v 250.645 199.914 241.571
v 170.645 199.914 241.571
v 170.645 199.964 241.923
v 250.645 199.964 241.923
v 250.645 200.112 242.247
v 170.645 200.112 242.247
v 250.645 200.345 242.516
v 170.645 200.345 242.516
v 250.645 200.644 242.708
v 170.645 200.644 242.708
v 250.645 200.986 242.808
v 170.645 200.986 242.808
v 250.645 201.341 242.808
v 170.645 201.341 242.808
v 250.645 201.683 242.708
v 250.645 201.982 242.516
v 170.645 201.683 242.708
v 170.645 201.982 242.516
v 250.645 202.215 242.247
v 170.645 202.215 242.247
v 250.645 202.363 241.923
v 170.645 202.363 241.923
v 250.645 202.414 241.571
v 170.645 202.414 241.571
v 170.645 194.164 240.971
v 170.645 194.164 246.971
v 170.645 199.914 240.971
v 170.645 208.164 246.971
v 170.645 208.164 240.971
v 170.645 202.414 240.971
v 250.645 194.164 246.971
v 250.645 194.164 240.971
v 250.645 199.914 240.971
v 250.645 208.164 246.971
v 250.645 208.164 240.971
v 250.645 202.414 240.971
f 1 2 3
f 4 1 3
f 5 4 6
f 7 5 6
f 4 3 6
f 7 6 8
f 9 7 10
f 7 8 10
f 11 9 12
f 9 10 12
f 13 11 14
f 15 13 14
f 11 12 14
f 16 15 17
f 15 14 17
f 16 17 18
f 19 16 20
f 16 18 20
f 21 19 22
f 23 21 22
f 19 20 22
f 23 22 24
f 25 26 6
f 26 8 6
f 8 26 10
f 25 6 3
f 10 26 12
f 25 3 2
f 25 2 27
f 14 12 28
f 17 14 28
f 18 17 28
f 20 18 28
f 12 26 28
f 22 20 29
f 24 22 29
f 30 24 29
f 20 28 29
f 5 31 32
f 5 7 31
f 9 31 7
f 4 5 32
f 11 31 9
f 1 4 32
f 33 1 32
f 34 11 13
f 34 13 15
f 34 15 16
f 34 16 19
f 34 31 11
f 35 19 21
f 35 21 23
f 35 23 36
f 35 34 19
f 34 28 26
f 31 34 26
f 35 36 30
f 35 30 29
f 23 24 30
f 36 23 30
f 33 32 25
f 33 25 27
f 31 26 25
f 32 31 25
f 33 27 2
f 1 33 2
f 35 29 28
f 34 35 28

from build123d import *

# Parameters (mm, degrees)
BOSS_EXTRUDE1_DEPTH      = 60
BOSS_EXTRUDE1_DEPTH_BACK = 20


with BuildPart() as part:
    # Sketch1 → Boss-Extrude1 (new, two sides: drawn at the far end of the back side and taken through both)
    with BuildSketch(Plane(origin=(190.645148, 0, 0), x_dir=(0, 0, -1), z_dir=(1, 0, 0)).offset(-BOSS_EXTRUDE1_DEPTH_BACK)):
        with BuildLine():
            Line((-246.970904961, 208.163538159), (-246.970904961, 205.163538159))
            Line((-246.970904961, 205.163538159), (-246.970904961, 197.163538159))
            Line((-246.970904961, 197.163538159), (-246.970904961, 194.163538159))
            Line((-246.970904961, 194.163538159), (-240.970904961, 194.163538159))
            Line((-240.970904961, 194.163538159), (-240.970904961, 197.163538159))
            Line((-240.970904961, 197.163538159), (-240.970904961, 199.913538158))
            Line((-240.970904961, 199.913538158), (-241.570904961, 199.913538158))
            ThreePointArc((-241.570904961, 199.913538158), (-242.820904961, 201.163538162), (-241.570904955, 202.413538158))
            Line((-241.570904955, 202.413538158), (-240.970904961, 202.413538158))
            Line((-240.970904961, 202.413538158), (-240.970904961, 205.163538159))
            Line((-240.970904961, 205.163538159), (-240.970904961, 208.163538159))
            Line((-240.970904961, 208.163538159), (-246.970904961, 208.163538159))
        make_face()
    extrude(amount=BOSS_EXTRUDE1_DEPTH + BOSS_EXTRUDE1_DEPTH_BACK)


solid = part.part
